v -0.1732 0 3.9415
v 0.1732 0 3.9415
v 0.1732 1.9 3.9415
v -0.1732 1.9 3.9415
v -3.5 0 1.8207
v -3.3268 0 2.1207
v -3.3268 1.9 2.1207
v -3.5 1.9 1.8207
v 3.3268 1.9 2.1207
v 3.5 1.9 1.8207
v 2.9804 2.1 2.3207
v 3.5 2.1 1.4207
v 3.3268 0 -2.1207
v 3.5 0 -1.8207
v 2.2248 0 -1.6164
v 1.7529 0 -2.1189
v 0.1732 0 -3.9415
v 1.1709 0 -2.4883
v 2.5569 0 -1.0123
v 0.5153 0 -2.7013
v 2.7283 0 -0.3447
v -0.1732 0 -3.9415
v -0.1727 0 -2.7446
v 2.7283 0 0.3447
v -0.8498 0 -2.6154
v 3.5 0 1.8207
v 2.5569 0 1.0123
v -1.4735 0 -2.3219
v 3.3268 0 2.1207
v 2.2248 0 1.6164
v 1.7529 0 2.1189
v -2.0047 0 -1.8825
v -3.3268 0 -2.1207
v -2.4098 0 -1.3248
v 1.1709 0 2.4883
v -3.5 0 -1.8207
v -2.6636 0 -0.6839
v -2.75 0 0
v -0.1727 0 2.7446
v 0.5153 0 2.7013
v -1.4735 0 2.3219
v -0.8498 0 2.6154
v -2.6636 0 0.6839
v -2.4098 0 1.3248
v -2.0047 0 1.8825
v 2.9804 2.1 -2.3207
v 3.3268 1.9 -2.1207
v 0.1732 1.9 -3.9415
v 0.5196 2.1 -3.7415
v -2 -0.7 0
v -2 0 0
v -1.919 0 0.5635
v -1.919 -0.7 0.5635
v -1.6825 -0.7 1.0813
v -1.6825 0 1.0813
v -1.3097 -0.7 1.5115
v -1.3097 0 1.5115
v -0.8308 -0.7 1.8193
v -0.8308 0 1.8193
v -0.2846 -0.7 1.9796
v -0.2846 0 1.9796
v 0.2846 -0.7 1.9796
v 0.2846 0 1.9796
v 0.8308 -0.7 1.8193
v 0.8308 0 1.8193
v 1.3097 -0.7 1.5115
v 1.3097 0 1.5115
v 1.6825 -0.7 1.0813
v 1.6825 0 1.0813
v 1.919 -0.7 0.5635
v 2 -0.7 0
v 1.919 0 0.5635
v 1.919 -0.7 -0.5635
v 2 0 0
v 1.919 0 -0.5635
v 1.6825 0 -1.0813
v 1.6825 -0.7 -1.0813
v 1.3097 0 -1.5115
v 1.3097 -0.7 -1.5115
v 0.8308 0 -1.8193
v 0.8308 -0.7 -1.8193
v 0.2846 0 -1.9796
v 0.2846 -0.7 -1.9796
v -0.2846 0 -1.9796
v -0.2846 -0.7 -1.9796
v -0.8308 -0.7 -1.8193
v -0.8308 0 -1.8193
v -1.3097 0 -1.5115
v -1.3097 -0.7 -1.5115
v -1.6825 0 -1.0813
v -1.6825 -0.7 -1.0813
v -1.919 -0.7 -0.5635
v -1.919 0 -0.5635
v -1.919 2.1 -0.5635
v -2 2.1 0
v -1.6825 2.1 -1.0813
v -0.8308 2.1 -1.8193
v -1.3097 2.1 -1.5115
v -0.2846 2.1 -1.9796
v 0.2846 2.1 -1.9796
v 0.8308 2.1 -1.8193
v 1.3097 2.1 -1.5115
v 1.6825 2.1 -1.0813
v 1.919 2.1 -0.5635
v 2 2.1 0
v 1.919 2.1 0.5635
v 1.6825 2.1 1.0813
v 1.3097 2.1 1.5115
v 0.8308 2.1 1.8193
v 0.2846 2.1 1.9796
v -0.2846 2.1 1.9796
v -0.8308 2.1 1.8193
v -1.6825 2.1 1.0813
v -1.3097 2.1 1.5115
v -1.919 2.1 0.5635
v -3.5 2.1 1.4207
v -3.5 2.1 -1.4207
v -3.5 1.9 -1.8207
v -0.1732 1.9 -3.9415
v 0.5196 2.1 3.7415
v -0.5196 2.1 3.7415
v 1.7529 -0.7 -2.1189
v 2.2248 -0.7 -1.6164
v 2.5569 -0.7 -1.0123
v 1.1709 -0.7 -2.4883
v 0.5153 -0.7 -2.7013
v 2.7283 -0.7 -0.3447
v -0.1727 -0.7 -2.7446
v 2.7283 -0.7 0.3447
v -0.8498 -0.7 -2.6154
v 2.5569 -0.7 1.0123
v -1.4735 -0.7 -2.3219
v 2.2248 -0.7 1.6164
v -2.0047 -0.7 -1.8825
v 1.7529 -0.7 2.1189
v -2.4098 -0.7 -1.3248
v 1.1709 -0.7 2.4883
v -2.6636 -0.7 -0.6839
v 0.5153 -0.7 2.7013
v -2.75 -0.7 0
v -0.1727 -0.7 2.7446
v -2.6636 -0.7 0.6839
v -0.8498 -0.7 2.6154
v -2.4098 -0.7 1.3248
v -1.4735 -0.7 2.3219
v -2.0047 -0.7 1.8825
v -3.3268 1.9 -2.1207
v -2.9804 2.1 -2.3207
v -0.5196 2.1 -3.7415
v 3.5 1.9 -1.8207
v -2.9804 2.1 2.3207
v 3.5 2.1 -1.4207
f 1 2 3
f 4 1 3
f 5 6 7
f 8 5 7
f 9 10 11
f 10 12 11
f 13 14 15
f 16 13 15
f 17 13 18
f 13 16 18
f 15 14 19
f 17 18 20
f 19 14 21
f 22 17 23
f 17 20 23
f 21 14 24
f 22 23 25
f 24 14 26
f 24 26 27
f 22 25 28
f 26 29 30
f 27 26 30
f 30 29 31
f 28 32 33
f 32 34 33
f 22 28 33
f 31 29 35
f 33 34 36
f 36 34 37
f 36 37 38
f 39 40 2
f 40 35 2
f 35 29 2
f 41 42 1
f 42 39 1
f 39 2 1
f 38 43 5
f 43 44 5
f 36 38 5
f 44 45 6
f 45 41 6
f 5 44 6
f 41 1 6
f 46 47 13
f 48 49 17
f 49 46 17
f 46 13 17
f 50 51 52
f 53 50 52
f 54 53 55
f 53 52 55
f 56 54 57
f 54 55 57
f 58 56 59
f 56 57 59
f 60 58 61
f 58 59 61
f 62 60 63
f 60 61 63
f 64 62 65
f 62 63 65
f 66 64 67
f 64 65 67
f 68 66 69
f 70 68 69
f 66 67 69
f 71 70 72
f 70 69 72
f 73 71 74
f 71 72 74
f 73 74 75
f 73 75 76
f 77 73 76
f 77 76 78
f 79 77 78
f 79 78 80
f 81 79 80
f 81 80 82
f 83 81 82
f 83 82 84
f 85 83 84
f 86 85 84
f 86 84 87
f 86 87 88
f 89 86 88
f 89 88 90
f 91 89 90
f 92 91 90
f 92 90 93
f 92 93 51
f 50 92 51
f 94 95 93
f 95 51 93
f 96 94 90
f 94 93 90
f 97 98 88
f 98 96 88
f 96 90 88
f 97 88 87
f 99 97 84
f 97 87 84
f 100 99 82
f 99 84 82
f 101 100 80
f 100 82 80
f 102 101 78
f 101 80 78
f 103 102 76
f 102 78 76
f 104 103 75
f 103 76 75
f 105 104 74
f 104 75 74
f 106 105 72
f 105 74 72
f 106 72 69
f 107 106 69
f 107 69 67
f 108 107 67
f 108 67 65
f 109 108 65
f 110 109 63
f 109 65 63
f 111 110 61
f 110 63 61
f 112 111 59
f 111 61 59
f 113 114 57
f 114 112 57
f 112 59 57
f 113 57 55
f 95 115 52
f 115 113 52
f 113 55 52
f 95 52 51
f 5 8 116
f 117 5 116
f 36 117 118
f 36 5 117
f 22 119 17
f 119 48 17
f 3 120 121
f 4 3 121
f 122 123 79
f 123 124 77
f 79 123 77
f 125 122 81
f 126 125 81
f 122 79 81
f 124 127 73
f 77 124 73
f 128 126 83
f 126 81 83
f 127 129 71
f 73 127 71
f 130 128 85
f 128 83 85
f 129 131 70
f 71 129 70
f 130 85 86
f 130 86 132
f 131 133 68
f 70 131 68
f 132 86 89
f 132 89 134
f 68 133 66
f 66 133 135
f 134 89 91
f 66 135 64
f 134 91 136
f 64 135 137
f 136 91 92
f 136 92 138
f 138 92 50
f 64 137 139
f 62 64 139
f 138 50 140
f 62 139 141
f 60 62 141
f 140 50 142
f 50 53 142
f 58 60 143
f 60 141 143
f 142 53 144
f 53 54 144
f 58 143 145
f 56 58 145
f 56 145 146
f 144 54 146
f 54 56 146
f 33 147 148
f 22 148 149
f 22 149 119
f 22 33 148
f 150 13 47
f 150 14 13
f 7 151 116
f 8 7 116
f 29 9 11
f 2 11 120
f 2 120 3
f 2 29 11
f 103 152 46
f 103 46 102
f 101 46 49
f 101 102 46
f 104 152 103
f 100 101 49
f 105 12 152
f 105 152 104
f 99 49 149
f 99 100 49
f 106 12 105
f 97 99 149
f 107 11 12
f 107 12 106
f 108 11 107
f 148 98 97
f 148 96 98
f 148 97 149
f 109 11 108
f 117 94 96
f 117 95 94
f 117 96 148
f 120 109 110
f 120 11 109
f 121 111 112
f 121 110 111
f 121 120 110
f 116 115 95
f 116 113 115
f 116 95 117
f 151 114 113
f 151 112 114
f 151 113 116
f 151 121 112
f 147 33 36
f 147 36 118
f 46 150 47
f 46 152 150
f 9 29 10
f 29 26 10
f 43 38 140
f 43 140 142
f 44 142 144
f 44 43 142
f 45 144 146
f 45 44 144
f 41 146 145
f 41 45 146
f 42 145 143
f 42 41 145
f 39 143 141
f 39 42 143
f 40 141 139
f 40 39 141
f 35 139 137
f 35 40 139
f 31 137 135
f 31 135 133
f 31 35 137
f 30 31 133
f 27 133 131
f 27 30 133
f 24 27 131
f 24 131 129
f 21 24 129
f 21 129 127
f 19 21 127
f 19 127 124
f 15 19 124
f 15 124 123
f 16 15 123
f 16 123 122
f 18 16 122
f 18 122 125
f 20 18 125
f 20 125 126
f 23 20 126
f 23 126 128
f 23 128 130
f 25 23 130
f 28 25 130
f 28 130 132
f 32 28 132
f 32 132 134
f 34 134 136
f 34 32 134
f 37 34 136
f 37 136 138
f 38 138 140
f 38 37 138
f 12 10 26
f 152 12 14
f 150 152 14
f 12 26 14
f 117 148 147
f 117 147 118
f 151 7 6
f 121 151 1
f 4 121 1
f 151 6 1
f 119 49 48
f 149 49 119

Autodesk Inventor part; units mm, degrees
ref_plane "YZ Plane" through (0, 0, 0) normal (1, 0, 0) x (0, 1, 0)
ref_plane "XZ Plane" through (0, 0, 0) normal (0, 1, 0) x (-1, 0, 0)
ref_plane "XY Plane" through (0, 0, 0) normal (0, 0, 1) x (1, 0, 0)
sketch "スケッチ2" plane through (0, 0, 0) normal (0, 1, 0) x (-1, 0, 0)
  circle A0 centre (0, 0) radius 2
  circle A1 centre (0, 0) radius 2.75
  circle A2 centre (0, 0) radius 3.5
  line L0 (3.2709, 0) -> (-4.3069, 0) construction
  line L1 (-3.5, -2.0207) -> (0, -4.0415)
  line L2 (-3.5, 0) -> (-3.5, -2.0207)
  line L3 (0, 3.4516) -> (0, -4.8702) construction
  line L4 (-3.5, 2.0207) -> (0, 4.0415)
  line L5 (-3.5, 0) -> (-3.5, 2.0207)
  line L6 (3.5, -2.0207) -> (0, -4.0415)
  line L7 (3.5, 0) -> (3.5, -2.0207)
  line L8 (3.5, 2.0207) -> (0, 4.0415)
  line L9 (3.5, 0) -> (3.5, 2.0207)
  dimension "d8" = 7
  dimension "d6" = 4
  dimension "d7" = 5.5
  dimension "d25" = 120
extrude "押し出し1" add sketch "スケッチ2" against normal blind 0.7 contours A1
extrude "押し出し2" add sketch "スケッチ2" along normal blind 2.1 contours A1 | A2 | L7 L6 A2 | A2 L8 L9 | A2 L4 L8 | L6 L1 A2 | A2 L5 L4 | L1 L2 A2
chamfer "面取り1" distance 0.2 angle 45 6 edges at (3.5, 1.05, -2.0207) (0, 1.05, -4.0415) (-3.5, 1.05, -2.0207) (-3.5, 1.05, 2.0207) (0, 1.05, 4.0415) (3.5, 1.05, 2.0207)
chamfer "面取り2" distance 0.2 angle 45 6 edges at (3.4134, 2.1, -1.9707) (0, 2.1, -3.9415) (-3.4134, 2.1, -1.9707) (-3.4134, 2.1, 1.9707) (0, 2.1, 3.9415) (3.4134, 2.1, 1.9707)
thread "ねじ1" size "M4x0.7" class "6H" standard "ANSI Metric M Profile" full length
properties part number "S4-07-3W" material "ステンレス鋼 AISI 304"
